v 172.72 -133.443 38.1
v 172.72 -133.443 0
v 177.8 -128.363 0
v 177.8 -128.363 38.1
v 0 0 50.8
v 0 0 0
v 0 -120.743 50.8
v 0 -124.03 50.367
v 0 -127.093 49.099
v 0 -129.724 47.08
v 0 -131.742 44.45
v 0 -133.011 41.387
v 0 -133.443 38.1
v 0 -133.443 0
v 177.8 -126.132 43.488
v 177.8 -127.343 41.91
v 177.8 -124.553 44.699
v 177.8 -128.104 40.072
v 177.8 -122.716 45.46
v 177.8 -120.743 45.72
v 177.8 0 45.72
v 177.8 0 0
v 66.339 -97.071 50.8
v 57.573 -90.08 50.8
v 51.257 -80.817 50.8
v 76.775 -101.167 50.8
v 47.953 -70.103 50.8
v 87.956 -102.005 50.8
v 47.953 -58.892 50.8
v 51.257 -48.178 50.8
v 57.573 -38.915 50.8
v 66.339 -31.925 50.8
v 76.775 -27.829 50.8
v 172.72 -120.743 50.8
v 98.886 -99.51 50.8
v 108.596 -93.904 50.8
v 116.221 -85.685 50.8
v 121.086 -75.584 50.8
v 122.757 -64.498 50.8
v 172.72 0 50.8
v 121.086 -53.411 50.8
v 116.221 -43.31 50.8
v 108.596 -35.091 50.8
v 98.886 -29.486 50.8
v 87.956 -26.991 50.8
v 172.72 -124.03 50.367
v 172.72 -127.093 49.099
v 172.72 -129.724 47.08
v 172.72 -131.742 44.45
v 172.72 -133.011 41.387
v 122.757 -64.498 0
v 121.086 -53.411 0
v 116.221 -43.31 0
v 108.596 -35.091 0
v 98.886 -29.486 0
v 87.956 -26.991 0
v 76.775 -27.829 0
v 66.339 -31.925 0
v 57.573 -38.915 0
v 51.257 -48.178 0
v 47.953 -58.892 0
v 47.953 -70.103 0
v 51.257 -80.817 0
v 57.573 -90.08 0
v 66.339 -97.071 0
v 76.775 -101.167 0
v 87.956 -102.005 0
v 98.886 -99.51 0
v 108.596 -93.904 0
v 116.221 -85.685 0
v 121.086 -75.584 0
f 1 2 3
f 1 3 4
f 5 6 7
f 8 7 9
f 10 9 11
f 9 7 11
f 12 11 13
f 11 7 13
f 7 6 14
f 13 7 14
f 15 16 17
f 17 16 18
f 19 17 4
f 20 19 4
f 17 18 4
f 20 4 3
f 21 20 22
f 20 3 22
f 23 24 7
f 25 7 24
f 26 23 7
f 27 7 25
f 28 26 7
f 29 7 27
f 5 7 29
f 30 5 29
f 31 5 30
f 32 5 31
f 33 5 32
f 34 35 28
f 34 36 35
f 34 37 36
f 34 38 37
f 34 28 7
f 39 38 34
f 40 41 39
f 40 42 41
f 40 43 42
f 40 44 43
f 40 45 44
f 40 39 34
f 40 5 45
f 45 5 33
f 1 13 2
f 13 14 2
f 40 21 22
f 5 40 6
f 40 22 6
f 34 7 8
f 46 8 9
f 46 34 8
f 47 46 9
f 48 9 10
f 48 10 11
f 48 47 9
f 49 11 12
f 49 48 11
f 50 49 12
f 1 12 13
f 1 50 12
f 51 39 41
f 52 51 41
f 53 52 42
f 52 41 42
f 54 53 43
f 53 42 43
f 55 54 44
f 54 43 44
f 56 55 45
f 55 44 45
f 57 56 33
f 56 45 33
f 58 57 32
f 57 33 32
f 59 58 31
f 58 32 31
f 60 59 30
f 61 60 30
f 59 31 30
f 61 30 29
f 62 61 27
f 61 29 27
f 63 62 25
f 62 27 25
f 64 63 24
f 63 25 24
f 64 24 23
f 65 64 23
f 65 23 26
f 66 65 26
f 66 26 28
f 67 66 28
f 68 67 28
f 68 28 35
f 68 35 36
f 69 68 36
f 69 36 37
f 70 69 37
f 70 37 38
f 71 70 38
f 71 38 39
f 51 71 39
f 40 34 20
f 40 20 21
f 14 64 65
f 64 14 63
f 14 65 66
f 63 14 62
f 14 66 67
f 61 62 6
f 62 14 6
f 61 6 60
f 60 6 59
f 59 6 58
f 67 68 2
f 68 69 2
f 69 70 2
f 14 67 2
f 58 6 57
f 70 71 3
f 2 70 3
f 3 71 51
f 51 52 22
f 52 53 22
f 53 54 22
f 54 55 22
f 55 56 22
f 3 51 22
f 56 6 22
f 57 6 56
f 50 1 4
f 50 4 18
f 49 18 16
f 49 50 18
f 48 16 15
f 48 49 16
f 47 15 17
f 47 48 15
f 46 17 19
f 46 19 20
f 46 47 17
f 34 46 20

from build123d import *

# Parameters (mm, degrees)
F0_W     = 109.517686
F0_H     = 66.721742
F1_DEPTH = 50.8
F2_R     = 37.612171
F3_DEPTH = 50.801
F4_R     = 12.7
F5_SIZE  = 5.08


with BuildPart() as f1:
    # F0 (on Top) → F1 (new body)
    with BuildSketch(Plane.XY):
        Polygon((177.8, 0), (0, 0), (0, -133.443484), (40.524788, -133.443484), (40.524788, -66.721742), (150.042474, -66.721742), (150.042474, -133.443484), (177.8, -133.443484), align=None)
        with Locations((95.283631, -100.082613)):
            Rectangle(F0_W, F0_H)
    extrude(amount=F1_DEPTH)

    # F2 (on face) → F3 (cut, through all)
    with BuildSketch(Plane.XY.offset(50.8)):
        with Locations((85.144848, -64.497687)):
            Circle(F2_R)
    extrude(amount=-F3_DEPTH, mode=Mode.SUBTRACT)

    # F4
    f4_edges = [f1.edges().sort_by_distance(p)[0] for p in [
        (88.9, -133.443484, 50.8),
    ]]
    fillet(f4_edges, radius=F4_R)

    # F5
    f5_edges = [f1.edges().sort_by_distance(p)[0] for p in [
        (177.8, -60.371742, 50.8),
    ]]
    chamfer(f5_edges, length=F5_SIZE)


solid = f1.part
